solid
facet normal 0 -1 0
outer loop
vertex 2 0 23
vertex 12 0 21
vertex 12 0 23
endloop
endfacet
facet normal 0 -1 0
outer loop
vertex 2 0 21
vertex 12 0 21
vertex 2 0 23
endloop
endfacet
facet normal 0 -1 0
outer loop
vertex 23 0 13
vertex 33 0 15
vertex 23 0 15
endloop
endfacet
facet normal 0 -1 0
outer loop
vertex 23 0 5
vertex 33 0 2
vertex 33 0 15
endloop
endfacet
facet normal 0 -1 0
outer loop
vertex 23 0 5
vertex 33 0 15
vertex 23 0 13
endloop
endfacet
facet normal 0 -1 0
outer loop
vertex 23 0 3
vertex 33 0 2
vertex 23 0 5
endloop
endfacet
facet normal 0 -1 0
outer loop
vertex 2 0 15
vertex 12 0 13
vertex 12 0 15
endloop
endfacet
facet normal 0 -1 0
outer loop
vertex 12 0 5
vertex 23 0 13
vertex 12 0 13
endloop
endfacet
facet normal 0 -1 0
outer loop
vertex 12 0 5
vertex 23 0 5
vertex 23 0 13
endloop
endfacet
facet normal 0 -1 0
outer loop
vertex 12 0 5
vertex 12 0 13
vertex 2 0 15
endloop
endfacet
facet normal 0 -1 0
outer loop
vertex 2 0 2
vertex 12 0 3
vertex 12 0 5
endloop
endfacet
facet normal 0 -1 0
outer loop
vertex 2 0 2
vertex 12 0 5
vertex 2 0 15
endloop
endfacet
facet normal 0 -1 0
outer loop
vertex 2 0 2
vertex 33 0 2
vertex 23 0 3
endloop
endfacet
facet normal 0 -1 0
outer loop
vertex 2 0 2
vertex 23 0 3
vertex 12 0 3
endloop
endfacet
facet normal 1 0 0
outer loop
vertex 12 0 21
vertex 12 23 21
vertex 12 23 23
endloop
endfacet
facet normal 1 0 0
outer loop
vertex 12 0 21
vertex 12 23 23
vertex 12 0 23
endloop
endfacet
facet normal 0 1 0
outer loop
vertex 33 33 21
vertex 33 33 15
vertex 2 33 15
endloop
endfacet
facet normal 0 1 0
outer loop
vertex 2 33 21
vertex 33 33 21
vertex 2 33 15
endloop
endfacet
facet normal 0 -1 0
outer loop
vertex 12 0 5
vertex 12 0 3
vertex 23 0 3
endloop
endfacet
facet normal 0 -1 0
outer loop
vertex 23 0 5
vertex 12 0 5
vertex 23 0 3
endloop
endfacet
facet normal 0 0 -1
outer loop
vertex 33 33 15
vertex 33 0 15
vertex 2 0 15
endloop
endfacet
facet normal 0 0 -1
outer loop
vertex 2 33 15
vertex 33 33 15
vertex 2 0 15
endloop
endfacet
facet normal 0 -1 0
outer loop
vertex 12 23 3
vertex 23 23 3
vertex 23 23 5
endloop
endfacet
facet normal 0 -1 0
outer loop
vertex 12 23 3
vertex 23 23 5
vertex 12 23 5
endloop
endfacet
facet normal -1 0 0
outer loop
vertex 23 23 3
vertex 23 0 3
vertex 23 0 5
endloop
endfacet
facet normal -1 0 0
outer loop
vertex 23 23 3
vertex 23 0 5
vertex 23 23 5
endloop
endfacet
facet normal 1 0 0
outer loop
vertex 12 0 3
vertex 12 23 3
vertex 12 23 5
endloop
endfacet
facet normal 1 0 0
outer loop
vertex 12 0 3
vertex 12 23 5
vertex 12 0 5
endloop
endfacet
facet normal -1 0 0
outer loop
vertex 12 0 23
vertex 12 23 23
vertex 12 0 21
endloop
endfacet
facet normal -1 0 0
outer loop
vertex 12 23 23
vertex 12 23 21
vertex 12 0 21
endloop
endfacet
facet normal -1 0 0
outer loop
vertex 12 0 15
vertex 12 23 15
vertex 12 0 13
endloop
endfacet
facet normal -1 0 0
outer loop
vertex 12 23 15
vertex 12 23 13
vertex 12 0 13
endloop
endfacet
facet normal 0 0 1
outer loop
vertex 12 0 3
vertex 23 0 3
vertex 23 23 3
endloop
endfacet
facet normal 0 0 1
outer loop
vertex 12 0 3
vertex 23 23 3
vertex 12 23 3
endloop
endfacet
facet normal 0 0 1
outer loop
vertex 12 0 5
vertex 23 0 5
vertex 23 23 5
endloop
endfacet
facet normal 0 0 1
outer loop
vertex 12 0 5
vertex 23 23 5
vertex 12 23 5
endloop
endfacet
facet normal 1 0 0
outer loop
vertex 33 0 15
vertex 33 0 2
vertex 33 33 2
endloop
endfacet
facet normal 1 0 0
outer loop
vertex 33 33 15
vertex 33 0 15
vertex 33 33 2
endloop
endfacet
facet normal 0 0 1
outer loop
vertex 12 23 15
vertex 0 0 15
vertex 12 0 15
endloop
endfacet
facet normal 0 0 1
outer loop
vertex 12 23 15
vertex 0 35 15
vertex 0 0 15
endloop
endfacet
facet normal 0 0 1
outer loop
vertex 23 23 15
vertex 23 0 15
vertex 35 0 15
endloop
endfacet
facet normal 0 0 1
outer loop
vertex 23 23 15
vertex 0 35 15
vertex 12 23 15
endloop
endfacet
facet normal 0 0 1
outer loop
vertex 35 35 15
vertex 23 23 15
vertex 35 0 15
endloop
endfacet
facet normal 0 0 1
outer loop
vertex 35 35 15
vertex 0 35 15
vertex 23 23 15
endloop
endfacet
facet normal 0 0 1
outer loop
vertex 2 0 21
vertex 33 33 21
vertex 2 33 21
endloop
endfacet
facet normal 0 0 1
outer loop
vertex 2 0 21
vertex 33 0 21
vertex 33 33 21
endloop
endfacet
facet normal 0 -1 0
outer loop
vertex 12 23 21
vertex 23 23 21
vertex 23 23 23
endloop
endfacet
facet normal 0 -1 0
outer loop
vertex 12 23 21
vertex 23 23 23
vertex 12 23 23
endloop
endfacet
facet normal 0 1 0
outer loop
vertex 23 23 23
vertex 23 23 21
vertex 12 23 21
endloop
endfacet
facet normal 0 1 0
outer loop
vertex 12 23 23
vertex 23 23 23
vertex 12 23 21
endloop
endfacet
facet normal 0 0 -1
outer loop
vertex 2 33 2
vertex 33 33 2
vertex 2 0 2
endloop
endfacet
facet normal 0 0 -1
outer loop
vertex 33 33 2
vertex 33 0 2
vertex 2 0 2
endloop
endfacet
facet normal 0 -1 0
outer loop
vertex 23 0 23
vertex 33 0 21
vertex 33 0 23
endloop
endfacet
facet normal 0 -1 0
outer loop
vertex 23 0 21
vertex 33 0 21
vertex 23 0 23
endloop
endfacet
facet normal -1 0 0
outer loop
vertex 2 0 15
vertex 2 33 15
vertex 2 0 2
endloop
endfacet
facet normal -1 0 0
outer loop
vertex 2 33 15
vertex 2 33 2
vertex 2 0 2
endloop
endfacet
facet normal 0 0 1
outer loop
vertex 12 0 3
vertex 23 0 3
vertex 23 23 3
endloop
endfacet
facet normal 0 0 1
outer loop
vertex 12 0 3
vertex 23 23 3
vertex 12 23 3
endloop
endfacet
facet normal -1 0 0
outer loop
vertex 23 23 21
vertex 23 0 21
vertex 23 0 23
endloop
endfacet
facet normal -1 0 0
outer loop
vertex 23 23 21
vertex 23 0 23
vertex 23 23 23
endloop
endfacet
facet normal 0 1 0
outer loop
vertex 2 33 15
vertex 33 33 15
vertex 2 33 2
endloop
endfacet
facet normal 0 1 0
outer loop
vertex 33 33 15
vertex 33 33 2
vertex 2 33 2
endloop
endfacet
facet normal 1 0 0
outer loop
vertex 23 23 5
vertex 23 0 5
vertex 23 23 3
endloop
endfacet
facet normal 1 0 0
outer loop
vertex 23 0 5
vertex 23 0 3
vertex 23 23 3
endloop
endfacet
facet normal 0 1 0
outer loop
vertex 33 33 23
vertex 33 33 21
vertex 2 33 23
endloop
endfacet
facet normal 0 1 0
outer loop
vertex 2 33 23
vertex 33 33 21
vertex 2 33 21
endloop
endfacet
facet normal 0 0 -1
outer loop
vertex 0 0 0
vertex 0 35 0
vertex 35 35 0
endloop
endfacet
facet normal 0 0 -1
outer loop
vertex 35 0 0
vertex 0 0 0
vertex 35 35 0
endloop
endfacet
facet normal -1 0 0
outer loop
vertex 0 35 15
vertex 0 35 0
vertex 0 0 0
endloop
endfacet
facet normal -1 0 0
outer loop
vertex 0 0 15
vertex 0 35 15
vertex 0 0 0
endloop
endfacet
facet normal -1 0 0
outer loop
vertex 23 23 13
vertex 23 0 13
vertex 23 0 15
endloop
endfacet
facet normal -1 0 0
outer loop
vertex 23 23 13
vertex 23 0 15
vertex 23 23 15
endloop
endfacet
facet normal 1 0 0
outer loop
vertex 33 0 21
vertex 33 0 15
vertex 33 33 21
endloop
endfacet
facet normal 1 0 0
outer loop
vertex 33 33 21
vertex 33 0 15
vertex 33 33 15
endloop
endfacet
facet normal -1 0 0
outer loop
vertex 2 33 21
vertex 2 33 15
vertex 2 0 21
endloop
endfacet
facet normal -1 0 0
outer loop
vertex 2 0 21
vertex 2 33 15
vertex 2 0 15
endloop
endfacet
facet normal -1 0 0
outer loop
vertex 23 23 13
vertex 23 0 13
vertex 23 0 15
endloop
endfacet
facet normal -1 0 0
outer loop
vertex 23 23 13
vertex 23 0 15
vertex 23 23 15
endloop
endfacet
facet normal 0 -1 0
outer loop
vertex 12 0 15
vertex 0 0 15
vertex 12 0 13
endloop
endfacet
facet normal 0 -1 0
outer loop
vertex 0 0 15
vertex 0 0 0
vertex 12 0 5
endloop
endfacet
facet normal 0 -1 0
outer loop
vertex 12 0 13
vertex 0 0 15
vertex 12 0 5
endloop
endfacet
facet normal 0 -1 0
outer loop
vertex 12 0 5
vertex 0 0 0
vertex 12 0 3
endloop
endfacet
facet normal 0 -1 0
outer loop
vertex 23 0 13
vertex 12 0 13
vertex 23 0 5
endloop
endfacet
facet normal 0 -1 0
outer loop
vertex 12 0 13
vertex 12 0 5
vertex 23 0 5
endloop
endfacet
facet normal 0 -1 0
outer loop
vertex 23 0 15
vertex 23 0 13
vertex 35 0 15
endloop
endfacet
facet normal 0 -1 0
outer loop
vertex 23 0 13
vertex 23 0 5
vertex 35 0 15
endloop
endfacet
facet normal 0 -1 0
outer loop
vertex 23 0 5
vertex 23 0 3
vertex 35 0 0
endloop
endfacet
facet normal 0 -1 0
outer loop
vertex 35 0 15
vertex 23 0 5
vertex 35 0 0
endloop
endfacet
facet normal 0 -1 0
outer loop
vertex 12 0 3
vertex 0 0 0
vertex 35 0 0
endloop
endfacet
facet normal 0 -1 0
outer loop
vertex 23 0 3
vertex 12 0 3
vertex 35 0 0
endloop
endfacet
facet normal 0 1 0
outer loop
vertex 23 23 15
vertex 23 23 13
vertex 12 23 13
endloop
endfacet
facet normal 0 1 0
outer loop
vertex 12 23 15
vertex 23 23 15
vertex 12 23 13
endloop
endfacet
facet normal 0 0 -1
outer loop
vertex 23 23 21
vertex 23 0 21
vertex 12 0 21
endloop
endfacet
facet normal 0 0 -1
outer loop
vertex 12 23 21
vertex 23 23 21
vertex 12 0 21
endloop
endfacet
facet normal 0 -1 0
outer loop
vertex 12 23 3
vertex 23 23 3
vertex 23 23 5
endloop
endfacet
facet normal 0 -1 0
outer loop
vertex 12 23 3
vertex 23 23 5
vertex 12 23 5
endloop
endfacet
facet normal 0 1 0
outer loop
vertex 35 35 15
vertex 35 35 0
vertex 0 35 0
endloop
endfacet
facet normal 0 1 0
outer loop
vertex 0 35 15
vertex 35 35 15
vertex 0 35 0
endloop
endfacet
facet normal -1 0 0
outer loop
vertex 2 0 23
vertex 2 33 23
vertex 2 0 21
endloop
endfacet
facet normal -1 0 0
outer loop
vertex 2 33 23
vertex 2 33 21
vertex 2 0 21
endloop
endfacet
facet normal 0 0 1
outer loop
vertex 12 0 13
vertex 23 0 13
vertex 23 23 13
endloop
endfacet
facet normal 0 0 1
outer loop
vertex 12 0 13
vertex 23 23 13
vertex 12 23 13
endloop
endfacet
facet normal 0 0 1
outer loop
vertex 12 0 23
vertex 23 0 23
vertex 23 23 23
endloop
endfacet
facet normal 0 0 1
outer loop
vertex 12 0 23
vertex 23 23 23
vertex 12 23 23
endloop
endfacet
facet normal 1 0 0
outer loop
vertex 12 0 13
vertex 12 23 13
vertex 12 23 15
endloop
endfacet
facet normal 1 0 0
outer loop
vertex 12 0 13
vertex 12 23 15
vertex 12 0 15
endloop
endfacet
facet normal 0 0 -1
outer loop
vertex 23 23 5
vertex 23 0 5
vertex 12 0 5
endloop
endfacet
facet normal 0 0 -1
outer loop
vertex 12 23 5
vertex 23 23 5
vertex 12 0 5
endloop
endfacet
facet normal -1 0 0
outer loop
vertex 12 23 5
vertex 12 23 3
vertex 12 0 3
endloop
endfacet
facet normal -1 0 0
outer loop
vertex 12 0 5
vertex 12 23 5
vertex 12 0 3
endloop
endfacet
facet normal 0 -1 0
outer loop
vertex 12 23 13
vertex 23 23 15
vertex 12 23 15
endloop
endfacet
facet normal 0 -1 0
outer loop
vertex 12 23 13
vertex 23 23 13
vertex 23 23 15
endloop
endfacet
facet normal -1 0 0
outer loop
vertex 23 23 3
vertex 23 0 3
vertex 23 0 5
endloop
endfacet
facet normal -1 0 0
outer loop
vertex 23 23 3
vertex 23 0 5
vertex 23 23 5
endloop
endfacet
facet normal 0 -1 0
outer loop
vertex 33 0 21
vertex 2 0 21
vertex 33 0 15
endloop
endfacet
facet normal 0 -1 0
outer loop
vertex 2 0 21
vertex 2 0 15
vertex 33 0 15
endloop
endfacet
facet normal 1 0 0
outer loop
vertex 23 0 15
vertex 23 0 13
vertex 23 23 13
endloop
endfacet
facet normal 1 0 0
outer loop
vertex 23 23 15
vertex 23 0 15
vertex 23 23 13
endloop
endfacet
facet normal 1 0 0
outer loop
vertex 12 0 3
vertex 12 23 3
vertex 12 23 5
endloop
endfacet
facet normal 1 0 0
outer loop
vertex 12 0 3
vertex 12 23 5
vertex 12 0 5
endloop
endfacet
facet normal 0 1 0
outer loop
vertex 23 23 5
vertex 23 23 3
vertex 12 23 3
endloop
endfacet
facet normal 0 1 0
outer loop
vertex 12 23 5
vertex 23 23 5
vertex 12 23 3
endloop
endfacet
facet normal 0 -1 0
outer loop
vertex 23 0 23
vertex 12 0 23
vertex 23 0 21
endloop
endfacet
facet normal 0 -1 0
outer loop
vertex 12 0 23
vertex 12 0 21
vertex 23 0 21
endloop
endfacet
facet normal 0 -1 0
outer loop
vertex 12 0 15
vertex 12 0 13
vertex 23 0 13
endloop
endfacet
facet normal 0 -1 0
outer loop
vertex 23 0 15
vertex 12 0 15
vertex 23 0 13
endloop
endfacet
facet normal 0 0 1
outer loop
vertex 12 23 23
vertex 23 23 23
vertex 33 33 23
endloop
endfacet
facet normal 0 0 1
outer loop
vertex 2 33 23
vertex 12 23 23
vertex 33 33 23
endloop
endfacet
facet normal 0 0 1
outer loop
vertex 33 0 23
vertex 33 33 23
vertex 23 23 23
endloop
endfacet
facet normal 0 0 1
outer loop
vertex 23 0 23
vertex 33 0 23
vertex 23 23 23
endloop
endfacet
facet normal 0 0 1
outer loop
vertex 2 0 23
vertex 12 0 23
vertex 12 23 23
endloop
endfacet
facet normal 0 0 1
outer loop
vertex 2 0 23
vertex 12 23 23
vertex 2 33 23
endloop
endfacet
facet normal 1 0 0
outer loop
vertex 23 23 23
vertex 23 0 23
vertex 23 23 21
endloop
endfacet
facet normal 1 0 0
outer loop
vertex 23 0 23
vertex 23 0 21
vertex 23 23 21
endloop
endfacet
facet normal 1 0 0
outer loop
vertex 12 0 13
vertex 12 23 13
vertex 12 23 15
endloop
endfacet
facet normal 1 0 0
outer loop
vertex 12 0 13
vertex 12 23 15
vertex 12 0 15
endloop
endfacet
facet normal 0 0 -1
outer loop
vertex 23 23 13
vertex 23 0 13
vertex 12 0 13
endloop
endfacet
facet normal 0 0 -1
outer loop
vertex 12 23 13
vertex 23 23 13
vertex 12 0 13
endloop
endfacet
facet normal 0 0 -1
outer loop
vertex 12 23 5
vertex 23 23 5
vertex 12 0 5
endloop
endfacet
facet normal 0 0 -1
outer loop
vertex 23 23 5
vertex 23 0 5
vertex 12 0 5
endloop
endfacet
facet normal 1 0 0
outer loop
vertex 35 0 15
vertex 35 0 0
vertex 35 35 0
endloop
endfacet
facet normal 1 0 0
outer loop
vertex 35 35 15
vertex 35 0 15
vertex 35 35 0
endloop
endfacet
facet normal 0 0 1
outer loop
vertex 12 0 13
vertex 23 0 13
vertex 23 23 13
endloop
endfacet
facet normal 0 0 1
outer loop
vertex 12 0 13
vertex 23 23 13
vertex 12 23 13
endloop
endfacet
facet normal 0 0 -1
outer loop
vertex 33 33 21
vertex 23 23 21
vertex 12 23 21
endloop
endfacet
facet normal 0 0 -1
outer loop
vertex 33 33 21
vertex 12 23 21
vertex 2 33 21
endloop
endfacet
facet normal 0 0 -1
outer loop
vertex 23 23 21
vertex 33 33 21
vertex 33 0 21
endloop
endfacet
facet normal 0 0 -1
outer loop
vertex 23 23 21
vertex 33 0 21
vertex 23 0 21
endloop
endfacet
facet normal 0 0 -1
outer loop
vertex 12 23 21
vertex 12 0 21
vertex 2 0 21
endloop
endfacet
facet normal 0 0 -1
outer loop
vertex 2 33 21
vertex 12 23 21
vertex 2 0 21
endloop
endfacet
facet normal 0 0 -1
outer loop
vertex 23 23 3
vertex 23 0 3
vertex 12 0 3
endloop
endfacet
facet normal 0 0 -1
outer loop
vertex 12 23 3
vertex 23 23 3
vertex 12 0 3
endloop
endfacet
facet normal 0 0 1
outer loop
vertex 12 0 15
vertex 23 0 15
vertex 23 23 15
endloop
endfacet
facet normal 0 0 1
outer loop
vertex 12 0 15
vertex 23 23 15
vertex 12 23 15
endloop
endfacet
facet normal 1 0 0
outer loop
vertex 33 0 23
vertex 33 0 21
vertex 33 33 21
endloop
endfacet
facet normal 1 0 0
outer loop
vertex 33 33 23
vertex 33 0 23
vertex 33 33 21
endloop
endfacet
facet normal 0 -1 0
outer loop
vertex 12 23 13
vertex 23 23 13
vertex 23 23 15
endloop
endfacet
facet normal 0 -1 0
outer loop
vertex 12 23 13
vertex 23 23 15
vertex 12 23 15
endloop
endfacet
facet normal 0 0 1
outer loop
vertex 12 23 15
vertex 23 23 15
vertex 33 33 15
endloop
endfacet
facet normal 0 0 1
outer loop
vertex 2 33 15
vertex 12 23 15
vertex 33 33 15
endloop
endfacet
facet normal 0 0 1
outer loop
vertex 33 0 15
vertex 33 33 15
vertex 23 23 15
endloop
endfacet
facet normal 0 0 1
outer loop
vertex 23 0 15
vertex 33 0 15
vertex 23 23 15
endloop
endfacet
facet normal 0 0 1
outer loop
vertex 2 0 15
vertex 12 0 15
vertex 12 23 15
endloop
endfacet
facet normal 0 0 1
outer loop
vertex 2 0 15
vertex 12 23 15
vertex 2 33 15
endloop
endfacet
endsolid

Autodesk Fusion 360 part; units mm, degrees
sketch "Esquisse1" plane through (0, 0, 0) normal (0, 0, 1) x (1, 0, 0)
  line L0 (0, 0) -> (35, 0)
  line L1 (35, 0) -> (35, 35)
  line L2 (35, 35) -> (0, 35)
  line L3 (0, 35) -> (0, 0)
  dimension "d11" = 35
  dimension "d12" = 35
sketch "Esquisse1 (2)" plane through (0, 0, 2) normal (0, 0, 1) x (-1, 0, 0) in component "Shield"
  line L0 (0, -36) -> (0, 0)
  line L1 (0, 0) -> (-36, 0)
  line L2 (-36, 0) -> (-36, -36)
  line L3 (-36, -36) -> (0, -36)
  line L4 (0, -36) -> (-2, -36)
  line L5 (-2, -36) -> (-2, -1)
  line L6 (-2, -1) -> (0, -1)
  line L7 (0, -1) -> (0, -36)
  line L8 (0, -36) -> (-35, -36)
  line L9 (-35, -36) -> (-35, -34)
  line L10 (-35, -34) -> (0, -34)
  line L11 (0, -34) -> (0, -36)
  line L12 (-35, -36) -> (-33, -36)
  line L13 (-33, -36) -> (-33, -1)
  line L14 (-33, -1) -> (-35, -1)
  line L15 (-35, -1) -> (-35, -36)
  line L16 (-35, -1) -> (0, -1)
  line L17 (0, -1) -> (0, -3)
  line L18 (0, -3) -> (-35, -3)
  line L19 (-35, -3) -> (-35, -1)
  dimension "d15" = 2
  dimension "d16" = 35
  dimension "d17" = 35
  dimension "d18" = 2
  dimension "d19" = 2
  dimension "d20" = 35
  dimension "d21" = 35
  dimension "d22" = 2
sketch "Esquisse2" plane through (0, 0, 2) normal (0, 0, 1) x (-1, 0, 0) in component "Shield"
  line L0 (-36, -2) -> (-34, -2)
  line L1 (-34, -2) -> (-34, -34)
  line L2 (-34, -34) -> (-2, -34)
  line L3 (-2, -34) -> (-2, -2)
  line L4 (-2, -2) -> (0, -2)
  line L5 (0, -2) -> (0, 0)
  line L6 (0, 0) -> (-36, 0)
  line L7 (-36, 0) -> (-36, -2)
sketch "Esquisse1 (3)" plane through (0, 0, 6) normal (0, 0, 1) x (-1, 0, 0) in component "e*"
  line L0 (-36, 0) -> (-36, -2)
  line L1 (-36, -2) -> (-34, -2)
  line L2 (-34, -2) -> (-34, -34)
  line L3 (-34, -34) -> (-2, -34)
  line L4 (-2, -34) -> (-2, -2)
  line L5 (-2, -2) -> (0, -2)
  line L6 (0, -2) -> (0, 0)
  line L7 (0, 0) -> (-36, 0)
  line L8 (-12, -24) -> (-24, -24)
  line L9 (-24, -24) -> (-24, -3.2536)
  line L10 (-24, -3.2536) -> (-12, -3.2536)
  line L11 (-12, -3.2536) -> (-12, -24)
  dimension "d27" = 10
  dimension "d28" = 10
  dimension "d30" = 10
sketch "Esquisse1 (4)" plane through (0, 0, 16) normal (0, 0, 1) x (-1, 0, 0) in component "plaque_haut"
  line L0 (-2, 0) -> (-34, 0)
  line L1 (-34, 0) -> (-34, -34)
  line L2 (-34, -34) -> (-2, -34)
  line L3 (-2, -34) -> (-2, 0)
  line L4 (-12, -24) -> (-24, -24)
  line L5 (-24, -24) -> (-24, 0)
  line L6 (-24, 0) -> (-12, 0)
  line L7 (-12, 0) -> (-12, -24)
  dimension "d131" = 10
  dimension "d132" = 10
  dimension "d133" = 10
sketch "Esquisse2 (2)" plane through (0, 0, 0) normal (0, 0, 1) x (1, 0, 0)
  line L0 (0, 0) -> (35, 0)
  line L1 (35, 0) -> (35, 35)
  line L2 (35, 35) -> (0, 35)
  line L3 (0, 35) -> (0, 0)
  dimension "d85" = 35
  dimension "d86" = 35
extrude "Extrusion4" add sketch "Esquisse2 (2)" along normal blind 2 makes body 1 in component "Shield"
sketch "Esquisse3" plane through (0, 0, 2) normal (0, 0, 1) x (-1, 0, 0)
  line L0 (0, -35) -> (0, 0)
  line L1 (0, 0) -> (-35, 0)
  line L2 (-35, 0) -> (-35, -35)
  line L3 (-35, -35) -> (0, -35)
  line L4 (0, -35) -> (-2, -35)
  line L5 (-2, -35) -> (-2, 0)
  line L6 (-2, 0) -> (0, 0)
  line L7 (0, 0) -> (0, -35)
  line L8 (0, -35) -> (-35, -35)
  line L9 (-35, -35) -> (-35, -33)
  line L10 (-35, -33) -> (0, -33)
  line L11 (0, -33) -> (0, -35)
  line L12 (-35, -35) -> (-33, -35)
  line L13 (-33, -35) -> (-33, 0)
  line L14 (-33, 0) -> (-35, 0)
  line L15 (-35, 0) -> (-35, -35)
  dimension "d89" = 2
  dimension "d90" = 35
  dimension "d91" = 35
  dimension "d92" = 2
  dimension "d93" = 2
  dimension "d94" = 35
extrude "Extrusion15" add sketch "Esquisse3" along normal blind 1 separate body contours L1 L5 L10 L13 makes body 2 in component "Support"
sketch "Esquisse1 (5)" plane through (0, 0, 3) normal (0, 0, 1) x (-1, 0, 0) in component "Plaque bas"
  line L0 (-33, -33) -> (-2, -33)
  line L1 (-2, -33) -> (-2, 0)
  line L2 (-2, 0) -> (-33, 0)
  line L3 (-33, 0) -> (-33, -33)
  line L4 (-12, 0) -> (-23, 0)
  line L5 (-23, 0) -> (-23, -23)
  line L6 (-23, -23) -> (-12, -23)
  line L7 (-12, -23) -> (-12, 0)
  dimension "d100" = 10
  dimension "d101" = 10
  dimension "d102" = 10
extrude "Extrusion16" add sketch "Esquisse1 (5)" along normal blind 2 contours L0 L1 L2 L3 L5 L6 L7 bodies 2 in component "Support"
extrude "Extrusion5" add 1 faces at (19.3333, 7.6667, 3) along direction (0, 0, 1) blind 2 separate body on bodies 2 makes body 3 in component "Plaque bas"
extrude "Extrusion17" add 1 faces at (29.6667, 18.6667, 5) along direction (0, 0, 1) blind 8 on bodies 2 bodies 2 in component "Support"
extrude "Extrusion18" add 1 faces at (19.3333, 7.6667, 5) along direction (0, 0, 1) blind 8 on bodies 3 bodies 2 in component "Support"
sketch "Esquisse2 (3)" plane through (0, 0, 13) normal (0, 0, 1) x (-1, 0, 0) in component "plaque_haut"
  line L0 (-2, 0) -> (-33, 0)
  line L1 (-33, 0) -> (-33, -33)
  line L2 (-33, -33) -> (-2, -33)
  line L3 (-2, -33) -> (-2, 0)
  line L4 (-12, 0) -> (-23, 0)
  line L5 (-23, 0) -> (-23, -23)
  line L6 (-23, -23) -> (-12, -23)
  line L7 (-12, -23) -> (-12, 0)
  point P0 (-23, 0)
  dimension "d111" = 10
  dimension "d112" = 10
  dimension "d113" = 10
extrude "Extrusion5'" add sketch "Esquisse2 (3)" along normal blind 2 separate body contours L0 L4 L5 L6 L7 makes body 4 in component "plaque_haut"
extrude "Extrusion19" add 1 faces at (22.6667, 11, 13) along direction (0, 0, 1) blind 2 on bodies 2 bodies 2 in component "Support"
copy_body "CopierCollerCorps3" bodies 4 makes body 5 in component "Support"
combine "Combiner2" operation cut target body 2 tool bodies 5 in component "Support"
extrude "Extrusion2" add 1 faces at (19.3333, 7.6667, 15) along direction (0, 0, 1) blind 6 separate body on bodies 4 makes body 6 in component "Mousse_haute"
extrude "Extrusion3" add 1 faces at (29.6667, 18.6667, 15) along direction (0, 0, 1) blind 6 on bodies 2 bodies 6 in component "Mousse_haute"
extrude "Extrusion5''" add 1 faces at (11.6667, 23.3333, 2) along direction (0, 0, 1) blind 13 on bodies 1 bodies 1 in component "Shield"
copy_body "CopierCollerCorps1" bodies 3 makes body 7 in component "Shield"
copy_body "CopierCollerCorps2" bodies 4 7 makes body 8 makes body 9 in component "Shield"
copy_body "CopierCollerCorps3'" bodies 4 makes body 10 in component "Shield"
combine "Combiner1" operation cut target body 1 tool bodies 7 8 9 10 in component "Shield"
sketch "Esquisse1 (6)" plane through (0, 0, 21) normal (0, 0, 1) x (-1, 0, 0) in component "Support"
  line L0 (-2, 0) -> (-33, 0)
  line L1 (-33, 0) -> (-33, -33)
  line L2 (-33, -33) -> (-2, -33)
  line L3 (-2, -33) -> (-2, 0)
  line L4 (-12, 0) -> (-23, 0)
  line L5 (-23, 0) -> (-23, -23)
  line L6 (-23, -23) -> (-12, -23)
  line L7 (-12, -23) -> (-12, 0)
  dimension "d124" = 10
  dimension "d125" = 10
  dimension "d126" = 10
extrude "Extrusion2'" add sketch "Esquisse1 (6)" along normal blind 2 separate body contours L0 L4 L5 L6 L7 makes body 11 in component "plateau_conducteur"
extrude "Extrusion1" add 1 faces at (22.6667, 11, 21) along direction (0, 0, 1) blind 2 separate body on bodies 6 makes body 12 in component "plateau_non_conducteur"
copy_body "CopierCollerCorps1'" bodies 11 makes body 13 in component "plateau_non_conducteur"
combine "Combiner1'" operation cut target body 12 tool bodies 13 in component "plateau_non_conducteur"
component "Shield" placed x (1, 0, 0) y (0, 1, 0) z (0, 0, 1) at (0, 0, 0)
component "Plaque bas" placed x (1, 0, 0) y (0, 1, 0) z (0, 0, 1) at (0, 0, 0)
component "Support" placed x (1, 0, 0) y (0, 1, 0) z (0, 0, 1) at (0, 0, 0)
component "Mousse_basse" placed x (1, 0, 0) y (0, 1, 0) z (0, 0, 1) at (0, 0, 0)
component "plaque_haut" placed x (1, 0, 0) y (0, 1, 0) z (0, 0, 1) at (0, 0, 0)
component "Mousse_haute" placed x (1, 0, 0) y (0, 1, 0) z (0, 0, 1) at (0, 0, 0)
component "plateau_conducteur" placed x (1, 0, 0) y (0, 1, 0) z (0, 0, 1) at (0, 0, 0)
component "plateau_non_conducteur" placed x (1, 0, 0) y (0, 1, 0) z (0, 0, 1) at (0, 0, 0)
component "e*" placed x (1, 0, 0) y (0, 1, 0) z (0, 0, 1) at (0, 0, 0) in component "Plaque bas"
equation "Deltax = 8 mm"
equation "Largeur_electrode = 8 mm"
equation "Longeur = 20 mm"
equation "epaisseur_mousse = 6 mm"
equation "Hauteur_support = 1 mm"
equation "deltad = 8 mm"
equation "Hauteur = epaisseur_mousse + epaisseur_electrode + deltad + Hauteur_support"
equation "Largeur = 35 mm"
equation "epaisseur_electrode = 2 mm"
equation "distance_bord_electrode = 10 mm"
equation "d11 = Largeur"
equation "d12 = Largeur"
equation "d15 = epaisseur_electrode"
equation "d16 = Largeur"
equation "d17 = Largeur"
equation "d18 = epaisseur_electrode"
equation "d19 = epaisseur_electrode"
equation "d20 = Largeur"
equation "d21 = Largeur"
equation "d22 = epaisseur_electrode"
equation "d27 = distance_bord_electrode"
equation "d28 = distance_bord_electrode"
equation "d30 = distance_bord_electrode"
equation "d85 = Largeur"
equation "d86 = Largeur"
equation "d87 = epaisseur_electrode"
equation "d89 = epaisseur_electrode"
equation "d90 = Largeur"
equation "d91 = Largeur"
equation "d92 = epaisseur_electrode"
equation "d93 = epaisseur_electrode"
equation "d94 = Largeur"
equation "d95 = Hauteur_support"
equation "d100 = distance_bord_electrode"
equation "d101 = distance_bord_electrode"
equation "d102 = distance_bord_electrode"
equation "d103 = epaisseur_electrode"
equation "d105 = epaisseur_electrode"
equation "d107 = deltad"
equation "d109 = deltad"
equation "d111 = distance_bord_electrode"
equation "d112 = distance_bord_electrode"
equation "d113 = distance_bord_electrode"
equation "d114 = epaisseur_electrode"
equation "d116 = epaisseur_electrode"
equation "d118 = epaisseur_mousse"
equation "d120 = epaisseur_mousse"
equation "d122 = deltad + 2 * epaisseur_electrode + Hauteur_support"
equation "d124 = distance_bord_electrode"
equation "d125 = distance_bord_electrode"
equation "d126 = distance_bord_electrode"
equation "d127 = epaisseur_electrode"
equation "d129 = epaisseur_electrode"
equation "d131 = distance_bord_electrode"
equation "d132 = distance_bord_electrode"
equation "d133 = distance_bord_electrode"
